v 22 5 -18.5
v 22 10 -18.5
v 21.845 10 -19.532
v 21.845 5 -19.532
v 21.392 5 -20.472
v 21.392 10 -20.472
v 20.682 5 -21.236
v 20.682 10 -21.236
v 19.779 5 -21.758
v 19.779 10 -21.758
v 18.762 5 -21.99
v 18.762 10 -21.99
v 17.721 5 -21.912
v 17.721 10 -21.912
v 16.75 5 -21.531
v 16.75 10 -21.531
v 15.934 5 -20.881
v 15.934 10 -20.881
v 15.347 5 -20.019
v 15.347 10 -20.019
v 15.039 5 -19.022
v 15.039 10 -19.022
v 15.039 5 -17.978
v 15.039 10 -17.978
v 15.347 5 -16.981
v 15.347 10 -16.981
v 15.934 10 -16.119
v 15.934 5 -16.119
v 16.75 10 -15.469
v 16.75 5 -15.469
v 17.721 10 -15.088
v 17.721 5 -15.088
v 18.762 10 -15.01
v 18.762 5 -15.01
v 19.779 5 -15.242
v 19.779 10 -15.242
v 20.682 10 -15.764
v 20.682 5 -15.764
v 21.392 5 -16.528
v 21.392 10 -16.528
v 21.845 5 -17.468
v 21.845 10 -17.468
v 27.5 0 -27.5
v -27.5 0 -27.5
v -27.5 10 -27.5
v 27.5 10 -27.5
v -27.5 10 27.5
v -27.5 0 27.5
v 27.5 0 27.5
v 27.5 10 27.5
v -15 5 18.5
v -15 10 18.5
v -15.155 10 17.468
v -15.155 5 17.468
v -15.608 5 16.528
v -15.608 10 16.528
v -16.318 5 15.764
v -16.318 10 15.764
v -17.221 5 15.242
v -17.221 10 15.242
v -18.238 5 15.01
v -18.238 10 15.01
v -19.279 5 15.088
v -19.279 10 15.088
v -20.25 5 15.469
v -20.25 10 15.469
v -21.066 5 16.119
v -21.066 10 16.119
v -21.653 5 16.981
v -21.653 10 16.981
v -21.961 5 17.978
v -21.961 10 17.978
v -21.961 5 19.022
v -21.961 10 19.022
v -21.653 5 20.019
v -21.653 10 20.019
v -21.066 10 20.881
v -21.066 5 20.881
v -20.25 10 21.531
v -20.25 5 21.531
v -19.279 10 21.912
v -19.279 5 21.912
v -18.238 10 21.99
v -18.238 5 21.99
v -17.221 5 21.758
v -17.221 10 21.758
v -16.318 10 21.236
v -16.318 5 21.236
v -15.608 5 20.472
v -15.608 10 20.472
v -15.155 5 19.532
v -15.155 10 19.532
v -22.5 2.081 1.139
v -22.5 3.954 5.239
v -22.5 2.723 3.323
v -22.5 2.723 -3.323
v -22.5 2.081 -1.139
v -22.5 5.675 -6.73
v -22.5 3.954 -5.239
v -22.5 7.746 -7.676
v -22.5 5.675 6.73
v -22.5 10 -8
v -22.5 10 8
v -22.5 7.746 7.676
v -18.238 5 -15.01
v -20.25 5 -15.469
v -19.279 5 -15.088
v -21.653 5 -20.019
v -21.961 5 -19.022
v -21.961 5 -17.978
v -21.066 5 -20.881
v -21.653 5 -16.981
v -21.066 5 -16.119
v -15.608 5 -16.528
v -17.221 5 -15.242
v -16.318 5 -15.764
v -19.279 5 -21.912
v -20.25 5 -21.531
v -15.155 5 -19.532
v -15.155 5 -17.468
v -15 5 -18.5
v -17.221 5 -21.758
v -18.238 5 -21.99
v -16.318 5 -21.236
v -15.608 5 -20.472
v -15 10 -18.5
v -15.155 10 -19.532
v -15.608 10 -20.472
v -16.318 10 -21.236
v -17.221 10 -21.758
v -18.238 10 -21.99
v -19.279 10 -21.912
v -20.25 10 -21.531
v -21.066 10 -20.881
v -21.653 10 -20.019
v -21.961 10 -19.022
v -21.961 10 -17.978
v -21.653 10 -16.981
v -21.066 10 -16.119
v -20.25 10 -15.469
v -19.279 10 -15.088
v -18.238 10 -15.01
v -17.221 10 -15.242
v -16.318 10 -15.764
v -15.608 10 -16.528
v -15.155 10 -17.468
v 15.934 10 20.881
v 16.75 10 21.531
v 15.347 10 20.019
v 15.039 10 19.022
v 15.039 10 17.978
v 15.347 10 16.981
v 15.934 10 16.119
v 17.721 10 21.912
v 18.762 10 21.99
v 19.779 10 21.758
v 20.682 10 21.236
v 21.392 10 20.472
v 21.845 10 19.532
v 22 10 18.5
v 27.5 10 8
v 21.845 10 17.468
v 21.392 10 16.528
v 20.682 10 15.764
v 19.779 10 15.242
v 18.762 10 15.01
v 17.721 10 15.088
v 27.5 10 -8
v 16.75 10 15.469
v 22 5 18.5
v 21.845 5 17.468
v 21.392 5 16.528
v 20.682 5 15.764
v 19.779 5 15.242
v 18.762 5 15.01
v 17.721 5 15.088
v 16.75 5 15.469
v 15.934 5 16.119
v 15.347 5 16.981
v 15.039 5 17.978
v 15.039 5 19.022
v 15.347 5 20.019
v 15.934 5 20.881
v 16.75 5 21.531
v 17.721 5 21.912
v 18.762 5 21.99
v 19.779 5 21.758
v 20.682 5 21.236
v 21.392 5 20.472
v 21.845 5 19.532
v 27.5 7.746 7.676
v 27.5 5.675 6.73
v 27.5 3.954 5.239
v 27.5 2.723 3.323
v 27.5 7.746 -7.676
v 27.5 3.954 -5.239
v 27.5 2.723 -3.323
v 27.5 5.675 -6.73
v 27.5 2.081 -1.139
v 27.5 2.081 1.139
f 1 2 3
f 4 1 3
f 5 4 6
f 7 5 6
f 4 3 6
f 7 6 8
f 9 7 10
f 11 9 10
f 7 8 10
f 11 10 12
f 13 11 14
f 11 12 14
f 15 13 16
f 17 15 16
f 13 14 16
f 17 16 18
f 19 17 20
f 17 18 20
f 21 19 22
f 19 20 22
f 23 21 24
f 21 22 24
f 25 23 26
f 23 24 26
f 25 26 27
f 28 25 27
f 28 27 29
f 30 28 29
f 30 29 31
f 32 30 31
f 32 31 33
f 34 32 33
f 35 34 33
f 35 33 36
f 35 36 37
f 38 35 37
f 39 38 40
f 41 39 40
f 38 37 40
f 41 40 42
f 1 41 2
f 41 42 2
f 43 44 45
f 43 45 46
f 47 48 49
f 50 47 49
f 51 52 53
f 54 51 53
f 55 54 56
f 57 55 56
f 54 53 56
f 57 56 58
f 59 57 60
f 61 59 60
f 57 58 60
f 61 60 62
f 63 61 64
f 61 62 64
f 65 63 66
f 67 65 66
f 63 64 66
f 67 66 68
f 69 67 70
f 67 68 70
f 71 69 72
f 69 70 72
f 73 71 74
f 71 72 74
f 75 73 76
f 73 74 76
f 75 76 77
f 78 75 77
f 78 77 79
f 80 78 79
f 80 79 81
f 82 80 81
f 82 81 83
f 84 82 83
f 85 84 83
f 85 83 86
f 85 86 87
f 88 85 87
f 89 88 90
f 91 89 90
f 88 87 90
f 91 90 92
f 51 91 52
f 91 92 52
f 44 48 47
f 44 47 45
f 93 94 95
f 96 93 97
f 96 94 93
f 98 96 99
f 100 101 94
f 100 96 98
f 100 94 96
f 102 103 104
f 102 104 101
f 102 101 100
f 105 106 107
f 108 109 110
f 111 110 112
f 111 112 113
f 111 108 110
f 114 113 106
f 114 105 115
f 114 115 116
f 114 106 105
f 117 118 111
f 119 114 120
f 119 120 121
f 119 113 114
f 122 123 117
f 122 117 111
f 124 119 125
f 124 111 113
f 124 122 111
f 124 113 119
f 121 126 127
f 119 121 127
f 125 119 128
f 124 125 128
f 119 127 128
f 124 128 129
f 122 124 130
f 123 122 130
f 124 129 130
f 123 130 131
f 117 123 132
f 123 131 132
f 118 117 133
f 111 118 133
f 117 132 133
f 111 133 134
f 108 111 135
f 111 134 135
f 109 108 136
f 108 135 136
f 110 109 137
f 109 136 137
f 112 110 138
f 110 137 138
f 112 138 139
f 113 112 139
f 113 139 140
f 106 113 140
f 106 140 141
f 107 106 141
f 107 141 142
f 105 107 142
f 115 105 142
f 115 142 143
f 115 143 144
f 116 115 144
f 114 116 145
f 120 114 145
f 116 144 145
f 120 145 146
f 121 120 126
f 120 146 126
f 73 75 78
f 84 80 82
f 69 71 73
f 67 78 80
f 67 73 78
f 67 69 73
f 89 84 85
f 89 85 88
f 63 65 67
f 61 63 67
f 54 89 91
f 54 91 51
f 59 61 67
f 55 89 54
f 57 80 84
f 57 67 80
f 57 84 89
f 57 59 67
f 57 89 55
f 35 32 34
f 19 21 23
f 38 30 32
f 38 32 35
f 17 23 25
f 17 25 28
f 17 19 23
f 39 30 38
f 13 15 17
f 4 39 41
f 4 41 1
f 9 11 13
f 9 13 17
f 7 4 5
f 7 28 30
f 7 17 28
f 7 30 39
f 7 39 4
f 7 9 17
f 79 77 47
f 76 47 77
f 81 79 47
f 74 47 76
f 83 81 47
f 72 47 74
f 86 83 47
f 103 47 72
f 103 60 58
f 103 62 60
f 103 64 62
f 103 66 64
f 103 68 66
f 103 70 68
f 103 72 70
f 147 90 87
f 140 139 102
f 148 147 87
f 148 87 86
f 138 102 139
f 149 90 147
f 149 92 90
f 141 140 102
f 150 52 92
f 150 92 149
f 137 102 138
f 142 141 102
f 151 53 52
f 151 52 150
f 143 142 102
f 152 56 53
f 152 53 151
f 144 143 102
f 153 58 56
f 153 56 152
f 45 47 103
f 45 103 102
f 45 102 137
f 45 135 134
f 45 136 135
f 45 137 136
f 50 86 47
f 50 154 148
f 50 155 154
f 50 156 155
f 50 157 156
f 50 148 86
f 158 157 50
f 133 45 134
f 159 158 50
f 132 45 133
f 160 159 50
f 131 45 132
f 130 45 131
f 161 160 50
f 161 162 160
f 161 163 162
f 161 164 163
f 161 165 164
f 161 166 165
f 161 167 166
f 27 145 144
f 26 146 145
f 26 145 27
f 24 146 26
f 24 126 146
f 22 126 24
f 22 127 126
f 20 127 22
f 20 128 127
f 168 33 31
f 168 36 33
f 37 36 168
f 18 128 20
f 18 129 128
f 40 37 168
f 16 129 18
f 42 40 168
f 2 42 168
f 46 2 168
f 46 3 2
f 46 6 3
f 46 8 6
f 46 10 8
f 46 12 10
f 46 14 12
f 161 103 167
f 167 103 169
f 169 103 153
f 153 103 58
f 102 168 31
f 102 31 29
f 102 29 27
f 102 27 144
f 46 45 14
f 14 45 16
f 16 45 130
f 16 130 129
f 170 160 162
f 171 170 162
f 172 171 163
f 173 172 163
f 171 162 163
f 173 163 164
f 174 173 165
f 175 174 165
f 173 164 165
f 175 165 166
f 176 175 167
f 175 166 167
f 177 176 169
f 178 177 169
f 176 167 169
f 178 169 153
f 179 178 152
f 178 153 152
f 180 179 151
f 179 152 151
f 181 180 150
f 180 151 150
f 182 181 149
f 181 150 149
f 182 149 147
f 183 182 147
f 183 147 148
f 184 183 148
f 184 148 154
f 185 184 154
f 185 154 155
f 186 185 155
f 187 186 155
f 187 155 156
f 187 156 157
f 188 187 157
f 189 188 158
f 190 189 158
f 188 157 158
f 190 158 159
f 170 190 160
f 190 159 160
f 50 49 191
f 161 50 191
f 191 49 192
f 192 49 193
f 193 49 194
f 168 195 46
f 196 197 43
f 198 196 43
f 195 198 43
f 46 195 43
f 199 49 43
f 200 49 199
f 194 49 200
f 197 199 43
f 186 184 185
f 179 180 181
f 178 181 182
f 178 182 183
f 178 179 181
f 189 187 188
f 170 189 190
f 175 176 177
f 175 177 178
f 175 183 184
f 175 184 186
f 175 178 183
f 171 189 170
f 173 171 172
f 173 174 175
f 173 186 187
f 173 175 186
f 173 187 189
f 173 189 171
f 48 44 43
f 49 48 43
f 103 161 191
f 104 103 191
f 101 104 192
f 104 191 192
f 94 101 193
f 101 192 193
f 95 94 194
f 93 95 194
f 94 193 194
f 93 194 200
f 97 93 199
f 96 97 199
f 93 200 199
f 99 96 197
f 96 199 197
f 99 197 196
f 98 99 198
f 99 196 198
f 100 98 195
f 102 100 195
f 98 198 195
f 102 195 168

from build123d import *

# Parameters (mm, degrees)
SKETCH1_W           = 55
SKETCH1_H           = 55
BOSS_EXTRUDE1_DEPTH = 10
SKETCH2_R           = 8
CUT_EXTRUDE1_DEPTH  = 50
SKETCH3_R           = 3.5
CUT_EXTRUDE2_DEPTH  = 5


with BuildPart() as part:
    # Sketch1 → Boss-Extrude1 (new body)
    with BuildSketch(Plane(origin=(0, 0, 0), x_dir=(1, 0, 0), z_dir=(0, 1, 0))):
        Rectangle(SKETCH1_W, SKETCH1_H)
    extrude(amount=BOSS_EXTRUDE1_DEPTH)

    # Sketch2 → Cut-Extrude1 (cut)
    with BuildSketch(Plane(origin=(27.5, 0, 0), x_dir=(0, 0, -1), z_dir=(1, 0, 0))):
        with Locations((0, 10)):
            Circle(SKETCH2_R)
    extrude(amount=-CUT_EXTRUDE1_DEPTH, mode=Mode.SUBTRACT)

    # Sketch3 → Cut-Extrude2 (cut)
    with BuildSketch(Plane(origin=(0, 10, 0), x_dir=(1, 0, 0), z_dir=(0, 1, 0))):
        with Locations((-18.5, 18.5)):
            Circle(SKETCH3_R)
        with Locations((18.5, 18.5)):
            Circle(SKETCH3_R)
        with Locations((-18.5, -18.5)):
            Circle(SKETCH3_R)
        with Locations((18.5, -18.5)):
            Circle(SKETCH3_R)
    extrude(amount=-CUT_EXTRUDE2_DEPTH, mode=Mode.SUBTRACT)


solid = part.part
